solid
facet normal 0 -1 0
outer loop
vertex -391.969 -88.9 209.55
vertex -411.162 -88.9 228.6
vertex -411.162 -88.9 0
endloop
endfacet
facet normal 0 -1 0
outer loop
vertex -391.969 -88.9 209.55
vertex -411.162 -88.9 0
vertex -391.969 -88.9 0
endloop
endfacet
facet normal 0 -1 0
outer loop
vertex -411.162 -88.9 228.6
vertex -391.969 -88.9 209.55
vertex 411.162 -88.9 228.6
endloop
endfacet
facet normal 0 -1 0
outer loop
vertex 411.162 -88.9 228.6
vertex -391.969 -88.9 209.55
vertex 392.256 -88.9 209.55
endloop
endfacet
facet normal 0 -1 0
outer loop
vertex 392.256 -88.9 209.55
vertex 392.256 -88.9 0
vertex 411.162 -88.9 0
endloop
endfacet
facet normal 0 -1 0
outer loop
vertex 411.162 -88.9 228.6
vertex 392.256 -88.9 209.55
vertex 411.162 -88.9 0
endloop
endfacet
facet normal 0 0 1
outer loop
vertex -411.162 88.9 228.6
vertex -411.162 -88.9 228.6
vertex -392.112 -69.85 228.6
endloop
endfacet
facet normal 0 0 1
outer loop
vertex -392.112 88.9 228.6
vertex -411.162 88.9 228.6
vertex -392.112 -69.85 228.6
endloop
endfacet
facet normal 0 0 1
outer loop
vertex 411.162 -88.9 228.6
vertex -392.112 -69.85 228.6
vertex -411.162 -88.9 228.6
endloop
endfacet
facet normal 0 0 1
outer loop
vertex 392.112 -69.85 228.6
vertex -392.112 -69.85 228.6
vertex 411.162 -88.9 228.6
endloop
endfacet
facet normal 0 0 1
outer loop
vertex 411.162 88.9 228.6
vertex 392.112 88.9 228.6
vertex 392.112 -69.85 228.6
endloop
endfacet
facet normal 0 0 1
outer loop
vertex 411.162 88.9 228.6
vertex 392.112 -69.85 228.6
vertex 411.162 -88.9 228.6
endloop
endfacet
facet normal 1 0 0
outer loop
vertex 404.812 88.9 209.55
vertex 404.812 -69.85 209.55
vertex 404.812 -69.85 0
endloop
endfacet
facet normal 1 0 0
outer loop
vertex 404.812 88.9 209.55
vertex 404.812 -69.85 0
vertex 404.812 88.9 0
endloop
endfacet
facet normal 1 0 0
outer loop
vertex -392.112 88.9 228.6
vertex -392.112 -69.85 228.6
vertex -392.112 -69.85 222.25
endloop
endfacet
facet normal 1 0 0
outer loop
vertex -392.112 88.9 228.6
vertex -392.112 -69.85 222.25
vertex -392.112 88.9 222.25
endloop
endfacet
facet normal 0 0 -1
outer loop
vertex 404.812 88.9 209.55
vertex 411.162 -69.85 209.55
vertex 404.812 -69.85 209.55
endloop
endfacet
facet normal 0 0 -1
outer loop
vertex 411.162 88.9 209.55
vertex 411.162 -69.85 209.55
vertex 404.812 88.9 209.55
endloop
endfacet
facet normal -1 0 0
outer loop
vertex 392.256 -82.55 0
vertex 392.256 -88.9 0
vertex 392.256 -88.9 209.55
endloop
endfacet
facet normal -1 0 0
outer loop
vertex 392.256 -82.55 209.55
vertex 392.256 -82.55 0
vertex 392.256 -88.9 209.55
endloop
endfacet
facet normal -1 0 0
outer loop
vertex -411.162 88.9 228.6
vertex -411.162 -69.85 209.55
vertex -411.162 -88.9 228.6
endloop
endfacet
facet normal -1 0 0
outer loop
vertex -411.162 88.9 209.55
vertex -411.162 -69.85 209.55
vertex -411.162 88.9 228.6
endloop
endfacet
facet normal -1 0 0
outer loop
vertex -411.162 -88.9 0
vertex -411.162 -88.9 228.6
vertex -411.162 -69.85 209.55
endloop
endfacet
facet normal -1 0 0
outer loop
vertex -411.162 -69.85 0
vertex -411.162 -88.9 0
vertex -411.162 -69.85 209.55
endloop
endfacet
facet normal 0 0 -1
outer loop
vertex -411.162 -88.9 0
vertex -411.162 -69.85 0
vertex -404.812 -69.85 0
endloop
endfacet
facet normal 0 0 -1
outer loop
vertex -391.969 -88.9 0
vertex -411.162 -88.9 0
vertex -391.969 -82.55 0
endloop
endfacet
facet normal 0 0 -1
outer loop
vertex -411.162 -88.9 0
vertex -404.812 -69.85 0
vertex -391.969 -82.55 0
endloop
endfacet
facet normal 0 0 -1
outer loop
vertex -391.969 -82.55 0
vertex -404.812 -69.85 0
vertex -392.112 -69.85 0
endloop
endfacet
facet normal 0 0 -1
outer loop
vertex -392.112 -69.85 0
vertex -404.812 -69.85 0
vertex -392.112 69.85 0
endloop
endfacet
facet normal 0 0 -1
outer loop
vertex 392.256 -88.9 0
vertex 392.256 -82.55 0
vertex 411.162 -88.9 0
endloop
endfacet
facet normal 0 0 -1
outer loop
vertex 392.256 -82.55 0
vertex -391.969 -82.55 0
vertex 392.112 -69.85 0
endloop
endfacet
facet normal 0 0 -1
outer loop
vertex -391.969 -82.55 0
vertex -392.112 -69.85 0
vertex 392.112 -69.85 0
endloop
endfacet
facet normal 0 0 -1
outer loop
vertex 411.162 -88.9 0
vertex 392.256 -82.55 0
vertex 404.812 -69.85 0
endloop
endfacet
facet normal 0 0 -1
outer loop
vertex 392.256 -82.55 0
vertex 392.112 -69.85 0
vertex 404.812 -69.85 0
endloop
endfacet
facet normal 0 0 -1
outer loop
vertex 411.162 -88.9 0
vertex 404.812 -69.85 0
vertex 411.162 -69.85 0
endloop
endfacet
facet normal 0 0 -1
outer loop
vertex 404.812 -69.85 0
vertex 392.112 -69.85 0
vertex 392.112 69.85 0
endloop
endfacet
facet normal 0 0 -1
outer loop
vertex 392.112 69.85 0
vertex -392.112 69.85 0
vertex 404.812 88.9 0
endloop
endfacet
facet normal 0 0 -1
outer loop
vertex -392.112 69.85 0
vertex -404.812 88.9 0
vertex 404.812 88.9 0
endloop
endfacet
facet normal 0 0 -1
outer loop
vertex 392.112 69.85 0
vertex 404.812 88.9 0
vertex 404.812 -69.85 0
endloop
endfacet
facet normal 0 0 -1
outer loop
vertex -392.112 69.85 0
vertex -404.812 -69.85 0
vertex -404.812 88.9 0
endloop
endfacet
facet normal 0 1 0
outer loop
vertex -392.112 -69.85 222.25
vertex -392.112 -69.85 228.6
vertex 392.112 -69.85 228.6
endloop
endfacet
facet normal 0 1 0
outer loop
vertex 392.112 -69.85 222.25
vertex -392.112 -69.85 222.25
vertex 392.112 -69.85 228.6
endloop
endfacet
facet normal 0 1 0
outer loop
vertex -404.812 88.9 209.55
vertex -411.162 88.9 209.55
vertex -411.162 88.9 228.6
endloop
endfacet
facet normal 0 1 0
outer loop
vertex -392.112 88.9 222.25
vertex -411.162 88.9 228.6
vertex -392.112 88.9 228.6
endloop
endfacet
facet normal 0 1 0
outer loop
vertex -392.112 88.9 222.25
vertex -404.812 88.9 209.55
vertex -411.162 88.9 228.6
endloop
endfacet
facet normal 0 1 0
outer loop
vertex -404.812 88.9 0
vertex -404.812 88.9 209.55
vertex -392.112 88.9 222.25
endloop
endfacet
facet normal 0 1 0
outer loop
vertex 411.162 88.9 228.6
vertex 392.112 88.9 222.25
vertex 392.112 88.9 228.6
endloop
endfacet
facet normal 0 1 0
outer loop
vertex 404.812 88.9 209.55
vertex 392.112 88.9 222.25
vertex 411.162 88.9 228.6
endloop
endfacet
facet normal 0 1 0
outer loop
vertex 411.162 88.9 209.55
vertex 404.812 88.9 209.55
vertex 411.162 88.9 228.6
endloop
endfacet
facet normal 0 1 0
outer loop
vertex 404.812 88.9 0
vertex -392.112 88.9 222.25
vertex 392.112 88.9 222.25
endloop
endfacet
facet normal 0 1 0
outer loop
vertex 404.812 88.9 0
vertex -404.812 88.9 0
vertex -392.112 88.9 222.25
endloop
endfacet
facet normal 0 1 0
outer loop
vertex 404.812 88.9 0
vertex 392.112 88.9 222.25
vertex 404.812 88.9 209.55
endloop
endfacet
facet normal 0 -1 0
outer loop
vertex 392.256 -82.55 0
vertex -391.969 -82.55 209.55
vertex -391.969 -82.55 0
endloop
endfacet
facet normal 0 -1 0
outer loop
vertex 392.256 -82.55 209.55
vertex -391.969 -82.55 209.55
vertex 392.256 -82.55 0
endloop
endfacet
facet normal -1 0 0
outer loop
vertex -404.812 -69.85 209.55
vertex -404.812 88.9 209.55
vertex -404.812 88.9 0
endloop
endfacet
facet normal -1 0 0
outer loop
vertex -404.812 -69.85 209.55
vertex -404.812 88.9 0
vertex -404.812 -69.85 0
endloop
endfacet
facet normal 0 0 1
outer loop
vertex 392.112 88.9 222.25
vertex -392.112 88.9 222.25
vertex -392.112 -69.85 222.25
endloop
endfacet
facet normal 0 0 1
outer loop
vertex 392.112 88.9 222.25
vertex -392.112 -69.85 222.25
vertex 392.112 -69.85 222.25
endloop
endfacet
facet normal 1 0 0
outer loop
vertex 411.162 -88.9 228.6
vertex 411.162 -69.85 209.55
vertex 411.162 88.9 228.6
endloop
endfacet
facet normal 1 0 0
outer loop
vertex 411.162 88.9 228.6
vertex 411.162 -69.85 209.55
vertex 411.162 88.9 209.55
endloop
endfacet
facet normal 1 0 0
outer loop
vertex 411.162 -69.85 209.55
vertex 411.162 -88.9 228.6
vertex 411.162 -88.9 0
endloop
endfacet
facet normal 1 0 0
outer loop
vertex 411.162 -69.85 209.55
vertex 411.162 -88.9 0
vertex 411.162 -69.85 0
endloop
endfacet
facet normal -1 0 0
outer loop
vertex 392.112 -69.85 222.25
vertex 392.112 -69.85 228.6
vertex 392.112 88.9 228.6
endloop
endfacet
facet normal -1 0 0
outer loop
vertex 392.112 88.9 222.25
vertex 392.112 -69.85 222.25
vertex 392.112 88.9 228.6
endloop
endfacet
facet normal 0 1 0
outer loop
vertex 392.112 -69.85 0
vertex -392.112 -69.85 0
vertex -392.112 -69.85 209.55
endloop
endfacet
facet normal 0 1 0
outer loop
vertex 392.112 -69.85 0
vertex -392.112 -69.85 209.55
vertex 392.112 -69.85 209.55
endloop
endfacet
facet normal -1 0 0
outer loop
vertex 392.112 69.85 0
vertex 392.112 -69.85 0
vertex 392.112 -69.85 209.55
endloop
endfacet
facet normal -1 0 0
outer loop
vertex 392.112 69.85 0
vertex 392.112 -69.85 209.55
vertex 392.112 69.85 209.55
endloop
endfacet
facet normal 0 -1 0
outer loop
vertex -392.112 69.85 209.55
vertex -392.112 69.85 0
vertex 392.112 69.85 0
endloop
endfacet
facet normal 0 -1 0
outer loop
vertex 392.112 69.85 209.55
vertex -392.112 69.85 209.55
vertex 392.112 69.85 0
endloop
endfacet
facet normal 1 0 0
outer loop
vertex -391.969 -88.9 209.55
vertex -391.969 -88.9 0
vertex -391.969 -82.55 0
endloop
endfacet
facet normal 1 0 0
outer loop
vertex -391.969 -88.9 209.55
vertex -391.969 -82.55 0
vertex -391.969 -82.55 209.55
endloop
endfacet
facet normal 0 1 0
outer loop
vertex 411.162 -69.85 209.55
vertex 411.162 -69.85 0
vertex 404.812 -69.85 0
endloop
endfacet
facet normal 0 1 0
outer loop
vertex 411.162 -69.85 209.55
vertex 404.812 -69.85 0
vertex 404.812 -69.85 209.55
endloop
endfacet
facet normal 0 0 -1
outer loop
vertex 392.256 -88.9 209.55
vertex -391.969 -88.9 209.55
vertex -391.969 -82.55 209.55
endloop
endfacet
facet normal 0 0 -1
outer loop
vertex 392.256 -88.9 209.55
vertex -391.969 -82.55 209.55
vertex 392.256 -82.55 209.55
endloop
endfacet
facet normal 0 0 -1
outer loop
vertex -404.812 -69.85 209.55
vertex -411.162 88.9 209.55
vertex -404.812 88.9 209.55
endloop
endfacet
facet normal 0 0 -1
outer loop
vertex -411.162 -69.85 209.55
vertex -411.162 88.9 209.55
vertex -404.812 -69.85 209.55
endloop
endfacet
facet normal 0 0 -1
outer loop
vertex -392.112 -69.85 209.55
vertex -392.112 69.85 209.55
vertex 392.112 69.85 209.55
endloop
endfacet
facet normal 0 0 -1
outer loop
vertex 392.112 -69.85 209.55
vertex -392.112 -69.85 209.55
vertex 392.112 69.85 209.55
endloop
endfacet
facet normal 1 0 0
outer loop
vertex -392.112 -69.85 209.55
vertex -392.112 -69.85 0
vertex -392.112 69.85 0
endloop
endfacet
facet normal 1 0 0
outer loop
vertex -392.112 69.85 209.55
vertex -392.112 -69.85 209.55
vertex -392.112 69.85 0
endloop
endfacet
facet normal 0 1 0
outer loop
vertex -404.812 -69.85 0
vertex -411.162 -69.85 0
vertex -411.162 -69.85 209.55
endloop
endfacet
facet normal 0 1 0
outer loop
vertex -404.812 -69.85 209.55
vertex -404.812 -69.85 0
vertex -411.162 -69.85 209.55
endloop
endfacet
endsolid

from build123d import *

# Parameters (mm, degrees)
F0_W      = 822.325
F0_H      = 177.8
F1_DEPTH  = 228.6
F2_T      = -19.05
F3_W      = 784.225
F3_H      = 209.55
F4_DEPTH  = 6.35
F5_W      = 158.75
F5_H      = 209.55
F6_DEPTH  = 6.35
F7_W      = 158.75
F7_H      = 209.55
F8_DEPTH  = 6.35
F9_W      = 784.225
F9_H      = 158.75
F10_DEPTH = 6.35


with BuildPart() as f1:
    # F0 (on Top) → F1 (new body)
    with BuildSketch(Plane.XY):
        Rectangle(F0_W, F0_H)
    extrude(amount=F1_DEPTH)

    # F2
    f2_openings = [f1.faces().sort_by_distance(p)[0] for p in [
        (0, 0, 0),
    ]]
    offset(amount=F2_T, openings=f2_openings)

    # F3 (on face) → F4 (cut)
    with BuildSketch(Plane.XZ.offset(88.9)):
        with Locations((0.143385, 104.775)):
            Rectangle(F3_W, F3_H)
    extrude(amount=-F4_DEPTH, mode=Mode.SUBTRACT)

    # F5 (on face) → F6 (cut)
    with BuildSketch(Plane(origin=(-411.1625, 0, 0), x_dir=(0, -1, 0), z_dir=(-1, 0, 0))):
        with Locations((-9.525, 104.775)):
            Rectangle(F5_W, F5_H)
    extrude(amount=-F6_DEPTH, mode=Mode.SUBTRACT)

    # F7 (on face) → F8 (cut)
    with BuildSketch(Plane.YZ.offset(411.1625)):
        with Locations((9.525, 104.775)):
            Rectangle(F7_W, F7_H)
    extrude(amount=-F8_DEPTH, mode=Mode.SUBTRACT)

    # F9 (on face) → F10 (cut)
    with BuildSketch(Plane.XY.offset(228.6)):
        with Locations((0, 9.525)):
            Rectangle(F9_W, F9_H)
    extrude(amount=-F10_DEPTH, mode=Mode.SUBTRACT)


solid = f1.part
